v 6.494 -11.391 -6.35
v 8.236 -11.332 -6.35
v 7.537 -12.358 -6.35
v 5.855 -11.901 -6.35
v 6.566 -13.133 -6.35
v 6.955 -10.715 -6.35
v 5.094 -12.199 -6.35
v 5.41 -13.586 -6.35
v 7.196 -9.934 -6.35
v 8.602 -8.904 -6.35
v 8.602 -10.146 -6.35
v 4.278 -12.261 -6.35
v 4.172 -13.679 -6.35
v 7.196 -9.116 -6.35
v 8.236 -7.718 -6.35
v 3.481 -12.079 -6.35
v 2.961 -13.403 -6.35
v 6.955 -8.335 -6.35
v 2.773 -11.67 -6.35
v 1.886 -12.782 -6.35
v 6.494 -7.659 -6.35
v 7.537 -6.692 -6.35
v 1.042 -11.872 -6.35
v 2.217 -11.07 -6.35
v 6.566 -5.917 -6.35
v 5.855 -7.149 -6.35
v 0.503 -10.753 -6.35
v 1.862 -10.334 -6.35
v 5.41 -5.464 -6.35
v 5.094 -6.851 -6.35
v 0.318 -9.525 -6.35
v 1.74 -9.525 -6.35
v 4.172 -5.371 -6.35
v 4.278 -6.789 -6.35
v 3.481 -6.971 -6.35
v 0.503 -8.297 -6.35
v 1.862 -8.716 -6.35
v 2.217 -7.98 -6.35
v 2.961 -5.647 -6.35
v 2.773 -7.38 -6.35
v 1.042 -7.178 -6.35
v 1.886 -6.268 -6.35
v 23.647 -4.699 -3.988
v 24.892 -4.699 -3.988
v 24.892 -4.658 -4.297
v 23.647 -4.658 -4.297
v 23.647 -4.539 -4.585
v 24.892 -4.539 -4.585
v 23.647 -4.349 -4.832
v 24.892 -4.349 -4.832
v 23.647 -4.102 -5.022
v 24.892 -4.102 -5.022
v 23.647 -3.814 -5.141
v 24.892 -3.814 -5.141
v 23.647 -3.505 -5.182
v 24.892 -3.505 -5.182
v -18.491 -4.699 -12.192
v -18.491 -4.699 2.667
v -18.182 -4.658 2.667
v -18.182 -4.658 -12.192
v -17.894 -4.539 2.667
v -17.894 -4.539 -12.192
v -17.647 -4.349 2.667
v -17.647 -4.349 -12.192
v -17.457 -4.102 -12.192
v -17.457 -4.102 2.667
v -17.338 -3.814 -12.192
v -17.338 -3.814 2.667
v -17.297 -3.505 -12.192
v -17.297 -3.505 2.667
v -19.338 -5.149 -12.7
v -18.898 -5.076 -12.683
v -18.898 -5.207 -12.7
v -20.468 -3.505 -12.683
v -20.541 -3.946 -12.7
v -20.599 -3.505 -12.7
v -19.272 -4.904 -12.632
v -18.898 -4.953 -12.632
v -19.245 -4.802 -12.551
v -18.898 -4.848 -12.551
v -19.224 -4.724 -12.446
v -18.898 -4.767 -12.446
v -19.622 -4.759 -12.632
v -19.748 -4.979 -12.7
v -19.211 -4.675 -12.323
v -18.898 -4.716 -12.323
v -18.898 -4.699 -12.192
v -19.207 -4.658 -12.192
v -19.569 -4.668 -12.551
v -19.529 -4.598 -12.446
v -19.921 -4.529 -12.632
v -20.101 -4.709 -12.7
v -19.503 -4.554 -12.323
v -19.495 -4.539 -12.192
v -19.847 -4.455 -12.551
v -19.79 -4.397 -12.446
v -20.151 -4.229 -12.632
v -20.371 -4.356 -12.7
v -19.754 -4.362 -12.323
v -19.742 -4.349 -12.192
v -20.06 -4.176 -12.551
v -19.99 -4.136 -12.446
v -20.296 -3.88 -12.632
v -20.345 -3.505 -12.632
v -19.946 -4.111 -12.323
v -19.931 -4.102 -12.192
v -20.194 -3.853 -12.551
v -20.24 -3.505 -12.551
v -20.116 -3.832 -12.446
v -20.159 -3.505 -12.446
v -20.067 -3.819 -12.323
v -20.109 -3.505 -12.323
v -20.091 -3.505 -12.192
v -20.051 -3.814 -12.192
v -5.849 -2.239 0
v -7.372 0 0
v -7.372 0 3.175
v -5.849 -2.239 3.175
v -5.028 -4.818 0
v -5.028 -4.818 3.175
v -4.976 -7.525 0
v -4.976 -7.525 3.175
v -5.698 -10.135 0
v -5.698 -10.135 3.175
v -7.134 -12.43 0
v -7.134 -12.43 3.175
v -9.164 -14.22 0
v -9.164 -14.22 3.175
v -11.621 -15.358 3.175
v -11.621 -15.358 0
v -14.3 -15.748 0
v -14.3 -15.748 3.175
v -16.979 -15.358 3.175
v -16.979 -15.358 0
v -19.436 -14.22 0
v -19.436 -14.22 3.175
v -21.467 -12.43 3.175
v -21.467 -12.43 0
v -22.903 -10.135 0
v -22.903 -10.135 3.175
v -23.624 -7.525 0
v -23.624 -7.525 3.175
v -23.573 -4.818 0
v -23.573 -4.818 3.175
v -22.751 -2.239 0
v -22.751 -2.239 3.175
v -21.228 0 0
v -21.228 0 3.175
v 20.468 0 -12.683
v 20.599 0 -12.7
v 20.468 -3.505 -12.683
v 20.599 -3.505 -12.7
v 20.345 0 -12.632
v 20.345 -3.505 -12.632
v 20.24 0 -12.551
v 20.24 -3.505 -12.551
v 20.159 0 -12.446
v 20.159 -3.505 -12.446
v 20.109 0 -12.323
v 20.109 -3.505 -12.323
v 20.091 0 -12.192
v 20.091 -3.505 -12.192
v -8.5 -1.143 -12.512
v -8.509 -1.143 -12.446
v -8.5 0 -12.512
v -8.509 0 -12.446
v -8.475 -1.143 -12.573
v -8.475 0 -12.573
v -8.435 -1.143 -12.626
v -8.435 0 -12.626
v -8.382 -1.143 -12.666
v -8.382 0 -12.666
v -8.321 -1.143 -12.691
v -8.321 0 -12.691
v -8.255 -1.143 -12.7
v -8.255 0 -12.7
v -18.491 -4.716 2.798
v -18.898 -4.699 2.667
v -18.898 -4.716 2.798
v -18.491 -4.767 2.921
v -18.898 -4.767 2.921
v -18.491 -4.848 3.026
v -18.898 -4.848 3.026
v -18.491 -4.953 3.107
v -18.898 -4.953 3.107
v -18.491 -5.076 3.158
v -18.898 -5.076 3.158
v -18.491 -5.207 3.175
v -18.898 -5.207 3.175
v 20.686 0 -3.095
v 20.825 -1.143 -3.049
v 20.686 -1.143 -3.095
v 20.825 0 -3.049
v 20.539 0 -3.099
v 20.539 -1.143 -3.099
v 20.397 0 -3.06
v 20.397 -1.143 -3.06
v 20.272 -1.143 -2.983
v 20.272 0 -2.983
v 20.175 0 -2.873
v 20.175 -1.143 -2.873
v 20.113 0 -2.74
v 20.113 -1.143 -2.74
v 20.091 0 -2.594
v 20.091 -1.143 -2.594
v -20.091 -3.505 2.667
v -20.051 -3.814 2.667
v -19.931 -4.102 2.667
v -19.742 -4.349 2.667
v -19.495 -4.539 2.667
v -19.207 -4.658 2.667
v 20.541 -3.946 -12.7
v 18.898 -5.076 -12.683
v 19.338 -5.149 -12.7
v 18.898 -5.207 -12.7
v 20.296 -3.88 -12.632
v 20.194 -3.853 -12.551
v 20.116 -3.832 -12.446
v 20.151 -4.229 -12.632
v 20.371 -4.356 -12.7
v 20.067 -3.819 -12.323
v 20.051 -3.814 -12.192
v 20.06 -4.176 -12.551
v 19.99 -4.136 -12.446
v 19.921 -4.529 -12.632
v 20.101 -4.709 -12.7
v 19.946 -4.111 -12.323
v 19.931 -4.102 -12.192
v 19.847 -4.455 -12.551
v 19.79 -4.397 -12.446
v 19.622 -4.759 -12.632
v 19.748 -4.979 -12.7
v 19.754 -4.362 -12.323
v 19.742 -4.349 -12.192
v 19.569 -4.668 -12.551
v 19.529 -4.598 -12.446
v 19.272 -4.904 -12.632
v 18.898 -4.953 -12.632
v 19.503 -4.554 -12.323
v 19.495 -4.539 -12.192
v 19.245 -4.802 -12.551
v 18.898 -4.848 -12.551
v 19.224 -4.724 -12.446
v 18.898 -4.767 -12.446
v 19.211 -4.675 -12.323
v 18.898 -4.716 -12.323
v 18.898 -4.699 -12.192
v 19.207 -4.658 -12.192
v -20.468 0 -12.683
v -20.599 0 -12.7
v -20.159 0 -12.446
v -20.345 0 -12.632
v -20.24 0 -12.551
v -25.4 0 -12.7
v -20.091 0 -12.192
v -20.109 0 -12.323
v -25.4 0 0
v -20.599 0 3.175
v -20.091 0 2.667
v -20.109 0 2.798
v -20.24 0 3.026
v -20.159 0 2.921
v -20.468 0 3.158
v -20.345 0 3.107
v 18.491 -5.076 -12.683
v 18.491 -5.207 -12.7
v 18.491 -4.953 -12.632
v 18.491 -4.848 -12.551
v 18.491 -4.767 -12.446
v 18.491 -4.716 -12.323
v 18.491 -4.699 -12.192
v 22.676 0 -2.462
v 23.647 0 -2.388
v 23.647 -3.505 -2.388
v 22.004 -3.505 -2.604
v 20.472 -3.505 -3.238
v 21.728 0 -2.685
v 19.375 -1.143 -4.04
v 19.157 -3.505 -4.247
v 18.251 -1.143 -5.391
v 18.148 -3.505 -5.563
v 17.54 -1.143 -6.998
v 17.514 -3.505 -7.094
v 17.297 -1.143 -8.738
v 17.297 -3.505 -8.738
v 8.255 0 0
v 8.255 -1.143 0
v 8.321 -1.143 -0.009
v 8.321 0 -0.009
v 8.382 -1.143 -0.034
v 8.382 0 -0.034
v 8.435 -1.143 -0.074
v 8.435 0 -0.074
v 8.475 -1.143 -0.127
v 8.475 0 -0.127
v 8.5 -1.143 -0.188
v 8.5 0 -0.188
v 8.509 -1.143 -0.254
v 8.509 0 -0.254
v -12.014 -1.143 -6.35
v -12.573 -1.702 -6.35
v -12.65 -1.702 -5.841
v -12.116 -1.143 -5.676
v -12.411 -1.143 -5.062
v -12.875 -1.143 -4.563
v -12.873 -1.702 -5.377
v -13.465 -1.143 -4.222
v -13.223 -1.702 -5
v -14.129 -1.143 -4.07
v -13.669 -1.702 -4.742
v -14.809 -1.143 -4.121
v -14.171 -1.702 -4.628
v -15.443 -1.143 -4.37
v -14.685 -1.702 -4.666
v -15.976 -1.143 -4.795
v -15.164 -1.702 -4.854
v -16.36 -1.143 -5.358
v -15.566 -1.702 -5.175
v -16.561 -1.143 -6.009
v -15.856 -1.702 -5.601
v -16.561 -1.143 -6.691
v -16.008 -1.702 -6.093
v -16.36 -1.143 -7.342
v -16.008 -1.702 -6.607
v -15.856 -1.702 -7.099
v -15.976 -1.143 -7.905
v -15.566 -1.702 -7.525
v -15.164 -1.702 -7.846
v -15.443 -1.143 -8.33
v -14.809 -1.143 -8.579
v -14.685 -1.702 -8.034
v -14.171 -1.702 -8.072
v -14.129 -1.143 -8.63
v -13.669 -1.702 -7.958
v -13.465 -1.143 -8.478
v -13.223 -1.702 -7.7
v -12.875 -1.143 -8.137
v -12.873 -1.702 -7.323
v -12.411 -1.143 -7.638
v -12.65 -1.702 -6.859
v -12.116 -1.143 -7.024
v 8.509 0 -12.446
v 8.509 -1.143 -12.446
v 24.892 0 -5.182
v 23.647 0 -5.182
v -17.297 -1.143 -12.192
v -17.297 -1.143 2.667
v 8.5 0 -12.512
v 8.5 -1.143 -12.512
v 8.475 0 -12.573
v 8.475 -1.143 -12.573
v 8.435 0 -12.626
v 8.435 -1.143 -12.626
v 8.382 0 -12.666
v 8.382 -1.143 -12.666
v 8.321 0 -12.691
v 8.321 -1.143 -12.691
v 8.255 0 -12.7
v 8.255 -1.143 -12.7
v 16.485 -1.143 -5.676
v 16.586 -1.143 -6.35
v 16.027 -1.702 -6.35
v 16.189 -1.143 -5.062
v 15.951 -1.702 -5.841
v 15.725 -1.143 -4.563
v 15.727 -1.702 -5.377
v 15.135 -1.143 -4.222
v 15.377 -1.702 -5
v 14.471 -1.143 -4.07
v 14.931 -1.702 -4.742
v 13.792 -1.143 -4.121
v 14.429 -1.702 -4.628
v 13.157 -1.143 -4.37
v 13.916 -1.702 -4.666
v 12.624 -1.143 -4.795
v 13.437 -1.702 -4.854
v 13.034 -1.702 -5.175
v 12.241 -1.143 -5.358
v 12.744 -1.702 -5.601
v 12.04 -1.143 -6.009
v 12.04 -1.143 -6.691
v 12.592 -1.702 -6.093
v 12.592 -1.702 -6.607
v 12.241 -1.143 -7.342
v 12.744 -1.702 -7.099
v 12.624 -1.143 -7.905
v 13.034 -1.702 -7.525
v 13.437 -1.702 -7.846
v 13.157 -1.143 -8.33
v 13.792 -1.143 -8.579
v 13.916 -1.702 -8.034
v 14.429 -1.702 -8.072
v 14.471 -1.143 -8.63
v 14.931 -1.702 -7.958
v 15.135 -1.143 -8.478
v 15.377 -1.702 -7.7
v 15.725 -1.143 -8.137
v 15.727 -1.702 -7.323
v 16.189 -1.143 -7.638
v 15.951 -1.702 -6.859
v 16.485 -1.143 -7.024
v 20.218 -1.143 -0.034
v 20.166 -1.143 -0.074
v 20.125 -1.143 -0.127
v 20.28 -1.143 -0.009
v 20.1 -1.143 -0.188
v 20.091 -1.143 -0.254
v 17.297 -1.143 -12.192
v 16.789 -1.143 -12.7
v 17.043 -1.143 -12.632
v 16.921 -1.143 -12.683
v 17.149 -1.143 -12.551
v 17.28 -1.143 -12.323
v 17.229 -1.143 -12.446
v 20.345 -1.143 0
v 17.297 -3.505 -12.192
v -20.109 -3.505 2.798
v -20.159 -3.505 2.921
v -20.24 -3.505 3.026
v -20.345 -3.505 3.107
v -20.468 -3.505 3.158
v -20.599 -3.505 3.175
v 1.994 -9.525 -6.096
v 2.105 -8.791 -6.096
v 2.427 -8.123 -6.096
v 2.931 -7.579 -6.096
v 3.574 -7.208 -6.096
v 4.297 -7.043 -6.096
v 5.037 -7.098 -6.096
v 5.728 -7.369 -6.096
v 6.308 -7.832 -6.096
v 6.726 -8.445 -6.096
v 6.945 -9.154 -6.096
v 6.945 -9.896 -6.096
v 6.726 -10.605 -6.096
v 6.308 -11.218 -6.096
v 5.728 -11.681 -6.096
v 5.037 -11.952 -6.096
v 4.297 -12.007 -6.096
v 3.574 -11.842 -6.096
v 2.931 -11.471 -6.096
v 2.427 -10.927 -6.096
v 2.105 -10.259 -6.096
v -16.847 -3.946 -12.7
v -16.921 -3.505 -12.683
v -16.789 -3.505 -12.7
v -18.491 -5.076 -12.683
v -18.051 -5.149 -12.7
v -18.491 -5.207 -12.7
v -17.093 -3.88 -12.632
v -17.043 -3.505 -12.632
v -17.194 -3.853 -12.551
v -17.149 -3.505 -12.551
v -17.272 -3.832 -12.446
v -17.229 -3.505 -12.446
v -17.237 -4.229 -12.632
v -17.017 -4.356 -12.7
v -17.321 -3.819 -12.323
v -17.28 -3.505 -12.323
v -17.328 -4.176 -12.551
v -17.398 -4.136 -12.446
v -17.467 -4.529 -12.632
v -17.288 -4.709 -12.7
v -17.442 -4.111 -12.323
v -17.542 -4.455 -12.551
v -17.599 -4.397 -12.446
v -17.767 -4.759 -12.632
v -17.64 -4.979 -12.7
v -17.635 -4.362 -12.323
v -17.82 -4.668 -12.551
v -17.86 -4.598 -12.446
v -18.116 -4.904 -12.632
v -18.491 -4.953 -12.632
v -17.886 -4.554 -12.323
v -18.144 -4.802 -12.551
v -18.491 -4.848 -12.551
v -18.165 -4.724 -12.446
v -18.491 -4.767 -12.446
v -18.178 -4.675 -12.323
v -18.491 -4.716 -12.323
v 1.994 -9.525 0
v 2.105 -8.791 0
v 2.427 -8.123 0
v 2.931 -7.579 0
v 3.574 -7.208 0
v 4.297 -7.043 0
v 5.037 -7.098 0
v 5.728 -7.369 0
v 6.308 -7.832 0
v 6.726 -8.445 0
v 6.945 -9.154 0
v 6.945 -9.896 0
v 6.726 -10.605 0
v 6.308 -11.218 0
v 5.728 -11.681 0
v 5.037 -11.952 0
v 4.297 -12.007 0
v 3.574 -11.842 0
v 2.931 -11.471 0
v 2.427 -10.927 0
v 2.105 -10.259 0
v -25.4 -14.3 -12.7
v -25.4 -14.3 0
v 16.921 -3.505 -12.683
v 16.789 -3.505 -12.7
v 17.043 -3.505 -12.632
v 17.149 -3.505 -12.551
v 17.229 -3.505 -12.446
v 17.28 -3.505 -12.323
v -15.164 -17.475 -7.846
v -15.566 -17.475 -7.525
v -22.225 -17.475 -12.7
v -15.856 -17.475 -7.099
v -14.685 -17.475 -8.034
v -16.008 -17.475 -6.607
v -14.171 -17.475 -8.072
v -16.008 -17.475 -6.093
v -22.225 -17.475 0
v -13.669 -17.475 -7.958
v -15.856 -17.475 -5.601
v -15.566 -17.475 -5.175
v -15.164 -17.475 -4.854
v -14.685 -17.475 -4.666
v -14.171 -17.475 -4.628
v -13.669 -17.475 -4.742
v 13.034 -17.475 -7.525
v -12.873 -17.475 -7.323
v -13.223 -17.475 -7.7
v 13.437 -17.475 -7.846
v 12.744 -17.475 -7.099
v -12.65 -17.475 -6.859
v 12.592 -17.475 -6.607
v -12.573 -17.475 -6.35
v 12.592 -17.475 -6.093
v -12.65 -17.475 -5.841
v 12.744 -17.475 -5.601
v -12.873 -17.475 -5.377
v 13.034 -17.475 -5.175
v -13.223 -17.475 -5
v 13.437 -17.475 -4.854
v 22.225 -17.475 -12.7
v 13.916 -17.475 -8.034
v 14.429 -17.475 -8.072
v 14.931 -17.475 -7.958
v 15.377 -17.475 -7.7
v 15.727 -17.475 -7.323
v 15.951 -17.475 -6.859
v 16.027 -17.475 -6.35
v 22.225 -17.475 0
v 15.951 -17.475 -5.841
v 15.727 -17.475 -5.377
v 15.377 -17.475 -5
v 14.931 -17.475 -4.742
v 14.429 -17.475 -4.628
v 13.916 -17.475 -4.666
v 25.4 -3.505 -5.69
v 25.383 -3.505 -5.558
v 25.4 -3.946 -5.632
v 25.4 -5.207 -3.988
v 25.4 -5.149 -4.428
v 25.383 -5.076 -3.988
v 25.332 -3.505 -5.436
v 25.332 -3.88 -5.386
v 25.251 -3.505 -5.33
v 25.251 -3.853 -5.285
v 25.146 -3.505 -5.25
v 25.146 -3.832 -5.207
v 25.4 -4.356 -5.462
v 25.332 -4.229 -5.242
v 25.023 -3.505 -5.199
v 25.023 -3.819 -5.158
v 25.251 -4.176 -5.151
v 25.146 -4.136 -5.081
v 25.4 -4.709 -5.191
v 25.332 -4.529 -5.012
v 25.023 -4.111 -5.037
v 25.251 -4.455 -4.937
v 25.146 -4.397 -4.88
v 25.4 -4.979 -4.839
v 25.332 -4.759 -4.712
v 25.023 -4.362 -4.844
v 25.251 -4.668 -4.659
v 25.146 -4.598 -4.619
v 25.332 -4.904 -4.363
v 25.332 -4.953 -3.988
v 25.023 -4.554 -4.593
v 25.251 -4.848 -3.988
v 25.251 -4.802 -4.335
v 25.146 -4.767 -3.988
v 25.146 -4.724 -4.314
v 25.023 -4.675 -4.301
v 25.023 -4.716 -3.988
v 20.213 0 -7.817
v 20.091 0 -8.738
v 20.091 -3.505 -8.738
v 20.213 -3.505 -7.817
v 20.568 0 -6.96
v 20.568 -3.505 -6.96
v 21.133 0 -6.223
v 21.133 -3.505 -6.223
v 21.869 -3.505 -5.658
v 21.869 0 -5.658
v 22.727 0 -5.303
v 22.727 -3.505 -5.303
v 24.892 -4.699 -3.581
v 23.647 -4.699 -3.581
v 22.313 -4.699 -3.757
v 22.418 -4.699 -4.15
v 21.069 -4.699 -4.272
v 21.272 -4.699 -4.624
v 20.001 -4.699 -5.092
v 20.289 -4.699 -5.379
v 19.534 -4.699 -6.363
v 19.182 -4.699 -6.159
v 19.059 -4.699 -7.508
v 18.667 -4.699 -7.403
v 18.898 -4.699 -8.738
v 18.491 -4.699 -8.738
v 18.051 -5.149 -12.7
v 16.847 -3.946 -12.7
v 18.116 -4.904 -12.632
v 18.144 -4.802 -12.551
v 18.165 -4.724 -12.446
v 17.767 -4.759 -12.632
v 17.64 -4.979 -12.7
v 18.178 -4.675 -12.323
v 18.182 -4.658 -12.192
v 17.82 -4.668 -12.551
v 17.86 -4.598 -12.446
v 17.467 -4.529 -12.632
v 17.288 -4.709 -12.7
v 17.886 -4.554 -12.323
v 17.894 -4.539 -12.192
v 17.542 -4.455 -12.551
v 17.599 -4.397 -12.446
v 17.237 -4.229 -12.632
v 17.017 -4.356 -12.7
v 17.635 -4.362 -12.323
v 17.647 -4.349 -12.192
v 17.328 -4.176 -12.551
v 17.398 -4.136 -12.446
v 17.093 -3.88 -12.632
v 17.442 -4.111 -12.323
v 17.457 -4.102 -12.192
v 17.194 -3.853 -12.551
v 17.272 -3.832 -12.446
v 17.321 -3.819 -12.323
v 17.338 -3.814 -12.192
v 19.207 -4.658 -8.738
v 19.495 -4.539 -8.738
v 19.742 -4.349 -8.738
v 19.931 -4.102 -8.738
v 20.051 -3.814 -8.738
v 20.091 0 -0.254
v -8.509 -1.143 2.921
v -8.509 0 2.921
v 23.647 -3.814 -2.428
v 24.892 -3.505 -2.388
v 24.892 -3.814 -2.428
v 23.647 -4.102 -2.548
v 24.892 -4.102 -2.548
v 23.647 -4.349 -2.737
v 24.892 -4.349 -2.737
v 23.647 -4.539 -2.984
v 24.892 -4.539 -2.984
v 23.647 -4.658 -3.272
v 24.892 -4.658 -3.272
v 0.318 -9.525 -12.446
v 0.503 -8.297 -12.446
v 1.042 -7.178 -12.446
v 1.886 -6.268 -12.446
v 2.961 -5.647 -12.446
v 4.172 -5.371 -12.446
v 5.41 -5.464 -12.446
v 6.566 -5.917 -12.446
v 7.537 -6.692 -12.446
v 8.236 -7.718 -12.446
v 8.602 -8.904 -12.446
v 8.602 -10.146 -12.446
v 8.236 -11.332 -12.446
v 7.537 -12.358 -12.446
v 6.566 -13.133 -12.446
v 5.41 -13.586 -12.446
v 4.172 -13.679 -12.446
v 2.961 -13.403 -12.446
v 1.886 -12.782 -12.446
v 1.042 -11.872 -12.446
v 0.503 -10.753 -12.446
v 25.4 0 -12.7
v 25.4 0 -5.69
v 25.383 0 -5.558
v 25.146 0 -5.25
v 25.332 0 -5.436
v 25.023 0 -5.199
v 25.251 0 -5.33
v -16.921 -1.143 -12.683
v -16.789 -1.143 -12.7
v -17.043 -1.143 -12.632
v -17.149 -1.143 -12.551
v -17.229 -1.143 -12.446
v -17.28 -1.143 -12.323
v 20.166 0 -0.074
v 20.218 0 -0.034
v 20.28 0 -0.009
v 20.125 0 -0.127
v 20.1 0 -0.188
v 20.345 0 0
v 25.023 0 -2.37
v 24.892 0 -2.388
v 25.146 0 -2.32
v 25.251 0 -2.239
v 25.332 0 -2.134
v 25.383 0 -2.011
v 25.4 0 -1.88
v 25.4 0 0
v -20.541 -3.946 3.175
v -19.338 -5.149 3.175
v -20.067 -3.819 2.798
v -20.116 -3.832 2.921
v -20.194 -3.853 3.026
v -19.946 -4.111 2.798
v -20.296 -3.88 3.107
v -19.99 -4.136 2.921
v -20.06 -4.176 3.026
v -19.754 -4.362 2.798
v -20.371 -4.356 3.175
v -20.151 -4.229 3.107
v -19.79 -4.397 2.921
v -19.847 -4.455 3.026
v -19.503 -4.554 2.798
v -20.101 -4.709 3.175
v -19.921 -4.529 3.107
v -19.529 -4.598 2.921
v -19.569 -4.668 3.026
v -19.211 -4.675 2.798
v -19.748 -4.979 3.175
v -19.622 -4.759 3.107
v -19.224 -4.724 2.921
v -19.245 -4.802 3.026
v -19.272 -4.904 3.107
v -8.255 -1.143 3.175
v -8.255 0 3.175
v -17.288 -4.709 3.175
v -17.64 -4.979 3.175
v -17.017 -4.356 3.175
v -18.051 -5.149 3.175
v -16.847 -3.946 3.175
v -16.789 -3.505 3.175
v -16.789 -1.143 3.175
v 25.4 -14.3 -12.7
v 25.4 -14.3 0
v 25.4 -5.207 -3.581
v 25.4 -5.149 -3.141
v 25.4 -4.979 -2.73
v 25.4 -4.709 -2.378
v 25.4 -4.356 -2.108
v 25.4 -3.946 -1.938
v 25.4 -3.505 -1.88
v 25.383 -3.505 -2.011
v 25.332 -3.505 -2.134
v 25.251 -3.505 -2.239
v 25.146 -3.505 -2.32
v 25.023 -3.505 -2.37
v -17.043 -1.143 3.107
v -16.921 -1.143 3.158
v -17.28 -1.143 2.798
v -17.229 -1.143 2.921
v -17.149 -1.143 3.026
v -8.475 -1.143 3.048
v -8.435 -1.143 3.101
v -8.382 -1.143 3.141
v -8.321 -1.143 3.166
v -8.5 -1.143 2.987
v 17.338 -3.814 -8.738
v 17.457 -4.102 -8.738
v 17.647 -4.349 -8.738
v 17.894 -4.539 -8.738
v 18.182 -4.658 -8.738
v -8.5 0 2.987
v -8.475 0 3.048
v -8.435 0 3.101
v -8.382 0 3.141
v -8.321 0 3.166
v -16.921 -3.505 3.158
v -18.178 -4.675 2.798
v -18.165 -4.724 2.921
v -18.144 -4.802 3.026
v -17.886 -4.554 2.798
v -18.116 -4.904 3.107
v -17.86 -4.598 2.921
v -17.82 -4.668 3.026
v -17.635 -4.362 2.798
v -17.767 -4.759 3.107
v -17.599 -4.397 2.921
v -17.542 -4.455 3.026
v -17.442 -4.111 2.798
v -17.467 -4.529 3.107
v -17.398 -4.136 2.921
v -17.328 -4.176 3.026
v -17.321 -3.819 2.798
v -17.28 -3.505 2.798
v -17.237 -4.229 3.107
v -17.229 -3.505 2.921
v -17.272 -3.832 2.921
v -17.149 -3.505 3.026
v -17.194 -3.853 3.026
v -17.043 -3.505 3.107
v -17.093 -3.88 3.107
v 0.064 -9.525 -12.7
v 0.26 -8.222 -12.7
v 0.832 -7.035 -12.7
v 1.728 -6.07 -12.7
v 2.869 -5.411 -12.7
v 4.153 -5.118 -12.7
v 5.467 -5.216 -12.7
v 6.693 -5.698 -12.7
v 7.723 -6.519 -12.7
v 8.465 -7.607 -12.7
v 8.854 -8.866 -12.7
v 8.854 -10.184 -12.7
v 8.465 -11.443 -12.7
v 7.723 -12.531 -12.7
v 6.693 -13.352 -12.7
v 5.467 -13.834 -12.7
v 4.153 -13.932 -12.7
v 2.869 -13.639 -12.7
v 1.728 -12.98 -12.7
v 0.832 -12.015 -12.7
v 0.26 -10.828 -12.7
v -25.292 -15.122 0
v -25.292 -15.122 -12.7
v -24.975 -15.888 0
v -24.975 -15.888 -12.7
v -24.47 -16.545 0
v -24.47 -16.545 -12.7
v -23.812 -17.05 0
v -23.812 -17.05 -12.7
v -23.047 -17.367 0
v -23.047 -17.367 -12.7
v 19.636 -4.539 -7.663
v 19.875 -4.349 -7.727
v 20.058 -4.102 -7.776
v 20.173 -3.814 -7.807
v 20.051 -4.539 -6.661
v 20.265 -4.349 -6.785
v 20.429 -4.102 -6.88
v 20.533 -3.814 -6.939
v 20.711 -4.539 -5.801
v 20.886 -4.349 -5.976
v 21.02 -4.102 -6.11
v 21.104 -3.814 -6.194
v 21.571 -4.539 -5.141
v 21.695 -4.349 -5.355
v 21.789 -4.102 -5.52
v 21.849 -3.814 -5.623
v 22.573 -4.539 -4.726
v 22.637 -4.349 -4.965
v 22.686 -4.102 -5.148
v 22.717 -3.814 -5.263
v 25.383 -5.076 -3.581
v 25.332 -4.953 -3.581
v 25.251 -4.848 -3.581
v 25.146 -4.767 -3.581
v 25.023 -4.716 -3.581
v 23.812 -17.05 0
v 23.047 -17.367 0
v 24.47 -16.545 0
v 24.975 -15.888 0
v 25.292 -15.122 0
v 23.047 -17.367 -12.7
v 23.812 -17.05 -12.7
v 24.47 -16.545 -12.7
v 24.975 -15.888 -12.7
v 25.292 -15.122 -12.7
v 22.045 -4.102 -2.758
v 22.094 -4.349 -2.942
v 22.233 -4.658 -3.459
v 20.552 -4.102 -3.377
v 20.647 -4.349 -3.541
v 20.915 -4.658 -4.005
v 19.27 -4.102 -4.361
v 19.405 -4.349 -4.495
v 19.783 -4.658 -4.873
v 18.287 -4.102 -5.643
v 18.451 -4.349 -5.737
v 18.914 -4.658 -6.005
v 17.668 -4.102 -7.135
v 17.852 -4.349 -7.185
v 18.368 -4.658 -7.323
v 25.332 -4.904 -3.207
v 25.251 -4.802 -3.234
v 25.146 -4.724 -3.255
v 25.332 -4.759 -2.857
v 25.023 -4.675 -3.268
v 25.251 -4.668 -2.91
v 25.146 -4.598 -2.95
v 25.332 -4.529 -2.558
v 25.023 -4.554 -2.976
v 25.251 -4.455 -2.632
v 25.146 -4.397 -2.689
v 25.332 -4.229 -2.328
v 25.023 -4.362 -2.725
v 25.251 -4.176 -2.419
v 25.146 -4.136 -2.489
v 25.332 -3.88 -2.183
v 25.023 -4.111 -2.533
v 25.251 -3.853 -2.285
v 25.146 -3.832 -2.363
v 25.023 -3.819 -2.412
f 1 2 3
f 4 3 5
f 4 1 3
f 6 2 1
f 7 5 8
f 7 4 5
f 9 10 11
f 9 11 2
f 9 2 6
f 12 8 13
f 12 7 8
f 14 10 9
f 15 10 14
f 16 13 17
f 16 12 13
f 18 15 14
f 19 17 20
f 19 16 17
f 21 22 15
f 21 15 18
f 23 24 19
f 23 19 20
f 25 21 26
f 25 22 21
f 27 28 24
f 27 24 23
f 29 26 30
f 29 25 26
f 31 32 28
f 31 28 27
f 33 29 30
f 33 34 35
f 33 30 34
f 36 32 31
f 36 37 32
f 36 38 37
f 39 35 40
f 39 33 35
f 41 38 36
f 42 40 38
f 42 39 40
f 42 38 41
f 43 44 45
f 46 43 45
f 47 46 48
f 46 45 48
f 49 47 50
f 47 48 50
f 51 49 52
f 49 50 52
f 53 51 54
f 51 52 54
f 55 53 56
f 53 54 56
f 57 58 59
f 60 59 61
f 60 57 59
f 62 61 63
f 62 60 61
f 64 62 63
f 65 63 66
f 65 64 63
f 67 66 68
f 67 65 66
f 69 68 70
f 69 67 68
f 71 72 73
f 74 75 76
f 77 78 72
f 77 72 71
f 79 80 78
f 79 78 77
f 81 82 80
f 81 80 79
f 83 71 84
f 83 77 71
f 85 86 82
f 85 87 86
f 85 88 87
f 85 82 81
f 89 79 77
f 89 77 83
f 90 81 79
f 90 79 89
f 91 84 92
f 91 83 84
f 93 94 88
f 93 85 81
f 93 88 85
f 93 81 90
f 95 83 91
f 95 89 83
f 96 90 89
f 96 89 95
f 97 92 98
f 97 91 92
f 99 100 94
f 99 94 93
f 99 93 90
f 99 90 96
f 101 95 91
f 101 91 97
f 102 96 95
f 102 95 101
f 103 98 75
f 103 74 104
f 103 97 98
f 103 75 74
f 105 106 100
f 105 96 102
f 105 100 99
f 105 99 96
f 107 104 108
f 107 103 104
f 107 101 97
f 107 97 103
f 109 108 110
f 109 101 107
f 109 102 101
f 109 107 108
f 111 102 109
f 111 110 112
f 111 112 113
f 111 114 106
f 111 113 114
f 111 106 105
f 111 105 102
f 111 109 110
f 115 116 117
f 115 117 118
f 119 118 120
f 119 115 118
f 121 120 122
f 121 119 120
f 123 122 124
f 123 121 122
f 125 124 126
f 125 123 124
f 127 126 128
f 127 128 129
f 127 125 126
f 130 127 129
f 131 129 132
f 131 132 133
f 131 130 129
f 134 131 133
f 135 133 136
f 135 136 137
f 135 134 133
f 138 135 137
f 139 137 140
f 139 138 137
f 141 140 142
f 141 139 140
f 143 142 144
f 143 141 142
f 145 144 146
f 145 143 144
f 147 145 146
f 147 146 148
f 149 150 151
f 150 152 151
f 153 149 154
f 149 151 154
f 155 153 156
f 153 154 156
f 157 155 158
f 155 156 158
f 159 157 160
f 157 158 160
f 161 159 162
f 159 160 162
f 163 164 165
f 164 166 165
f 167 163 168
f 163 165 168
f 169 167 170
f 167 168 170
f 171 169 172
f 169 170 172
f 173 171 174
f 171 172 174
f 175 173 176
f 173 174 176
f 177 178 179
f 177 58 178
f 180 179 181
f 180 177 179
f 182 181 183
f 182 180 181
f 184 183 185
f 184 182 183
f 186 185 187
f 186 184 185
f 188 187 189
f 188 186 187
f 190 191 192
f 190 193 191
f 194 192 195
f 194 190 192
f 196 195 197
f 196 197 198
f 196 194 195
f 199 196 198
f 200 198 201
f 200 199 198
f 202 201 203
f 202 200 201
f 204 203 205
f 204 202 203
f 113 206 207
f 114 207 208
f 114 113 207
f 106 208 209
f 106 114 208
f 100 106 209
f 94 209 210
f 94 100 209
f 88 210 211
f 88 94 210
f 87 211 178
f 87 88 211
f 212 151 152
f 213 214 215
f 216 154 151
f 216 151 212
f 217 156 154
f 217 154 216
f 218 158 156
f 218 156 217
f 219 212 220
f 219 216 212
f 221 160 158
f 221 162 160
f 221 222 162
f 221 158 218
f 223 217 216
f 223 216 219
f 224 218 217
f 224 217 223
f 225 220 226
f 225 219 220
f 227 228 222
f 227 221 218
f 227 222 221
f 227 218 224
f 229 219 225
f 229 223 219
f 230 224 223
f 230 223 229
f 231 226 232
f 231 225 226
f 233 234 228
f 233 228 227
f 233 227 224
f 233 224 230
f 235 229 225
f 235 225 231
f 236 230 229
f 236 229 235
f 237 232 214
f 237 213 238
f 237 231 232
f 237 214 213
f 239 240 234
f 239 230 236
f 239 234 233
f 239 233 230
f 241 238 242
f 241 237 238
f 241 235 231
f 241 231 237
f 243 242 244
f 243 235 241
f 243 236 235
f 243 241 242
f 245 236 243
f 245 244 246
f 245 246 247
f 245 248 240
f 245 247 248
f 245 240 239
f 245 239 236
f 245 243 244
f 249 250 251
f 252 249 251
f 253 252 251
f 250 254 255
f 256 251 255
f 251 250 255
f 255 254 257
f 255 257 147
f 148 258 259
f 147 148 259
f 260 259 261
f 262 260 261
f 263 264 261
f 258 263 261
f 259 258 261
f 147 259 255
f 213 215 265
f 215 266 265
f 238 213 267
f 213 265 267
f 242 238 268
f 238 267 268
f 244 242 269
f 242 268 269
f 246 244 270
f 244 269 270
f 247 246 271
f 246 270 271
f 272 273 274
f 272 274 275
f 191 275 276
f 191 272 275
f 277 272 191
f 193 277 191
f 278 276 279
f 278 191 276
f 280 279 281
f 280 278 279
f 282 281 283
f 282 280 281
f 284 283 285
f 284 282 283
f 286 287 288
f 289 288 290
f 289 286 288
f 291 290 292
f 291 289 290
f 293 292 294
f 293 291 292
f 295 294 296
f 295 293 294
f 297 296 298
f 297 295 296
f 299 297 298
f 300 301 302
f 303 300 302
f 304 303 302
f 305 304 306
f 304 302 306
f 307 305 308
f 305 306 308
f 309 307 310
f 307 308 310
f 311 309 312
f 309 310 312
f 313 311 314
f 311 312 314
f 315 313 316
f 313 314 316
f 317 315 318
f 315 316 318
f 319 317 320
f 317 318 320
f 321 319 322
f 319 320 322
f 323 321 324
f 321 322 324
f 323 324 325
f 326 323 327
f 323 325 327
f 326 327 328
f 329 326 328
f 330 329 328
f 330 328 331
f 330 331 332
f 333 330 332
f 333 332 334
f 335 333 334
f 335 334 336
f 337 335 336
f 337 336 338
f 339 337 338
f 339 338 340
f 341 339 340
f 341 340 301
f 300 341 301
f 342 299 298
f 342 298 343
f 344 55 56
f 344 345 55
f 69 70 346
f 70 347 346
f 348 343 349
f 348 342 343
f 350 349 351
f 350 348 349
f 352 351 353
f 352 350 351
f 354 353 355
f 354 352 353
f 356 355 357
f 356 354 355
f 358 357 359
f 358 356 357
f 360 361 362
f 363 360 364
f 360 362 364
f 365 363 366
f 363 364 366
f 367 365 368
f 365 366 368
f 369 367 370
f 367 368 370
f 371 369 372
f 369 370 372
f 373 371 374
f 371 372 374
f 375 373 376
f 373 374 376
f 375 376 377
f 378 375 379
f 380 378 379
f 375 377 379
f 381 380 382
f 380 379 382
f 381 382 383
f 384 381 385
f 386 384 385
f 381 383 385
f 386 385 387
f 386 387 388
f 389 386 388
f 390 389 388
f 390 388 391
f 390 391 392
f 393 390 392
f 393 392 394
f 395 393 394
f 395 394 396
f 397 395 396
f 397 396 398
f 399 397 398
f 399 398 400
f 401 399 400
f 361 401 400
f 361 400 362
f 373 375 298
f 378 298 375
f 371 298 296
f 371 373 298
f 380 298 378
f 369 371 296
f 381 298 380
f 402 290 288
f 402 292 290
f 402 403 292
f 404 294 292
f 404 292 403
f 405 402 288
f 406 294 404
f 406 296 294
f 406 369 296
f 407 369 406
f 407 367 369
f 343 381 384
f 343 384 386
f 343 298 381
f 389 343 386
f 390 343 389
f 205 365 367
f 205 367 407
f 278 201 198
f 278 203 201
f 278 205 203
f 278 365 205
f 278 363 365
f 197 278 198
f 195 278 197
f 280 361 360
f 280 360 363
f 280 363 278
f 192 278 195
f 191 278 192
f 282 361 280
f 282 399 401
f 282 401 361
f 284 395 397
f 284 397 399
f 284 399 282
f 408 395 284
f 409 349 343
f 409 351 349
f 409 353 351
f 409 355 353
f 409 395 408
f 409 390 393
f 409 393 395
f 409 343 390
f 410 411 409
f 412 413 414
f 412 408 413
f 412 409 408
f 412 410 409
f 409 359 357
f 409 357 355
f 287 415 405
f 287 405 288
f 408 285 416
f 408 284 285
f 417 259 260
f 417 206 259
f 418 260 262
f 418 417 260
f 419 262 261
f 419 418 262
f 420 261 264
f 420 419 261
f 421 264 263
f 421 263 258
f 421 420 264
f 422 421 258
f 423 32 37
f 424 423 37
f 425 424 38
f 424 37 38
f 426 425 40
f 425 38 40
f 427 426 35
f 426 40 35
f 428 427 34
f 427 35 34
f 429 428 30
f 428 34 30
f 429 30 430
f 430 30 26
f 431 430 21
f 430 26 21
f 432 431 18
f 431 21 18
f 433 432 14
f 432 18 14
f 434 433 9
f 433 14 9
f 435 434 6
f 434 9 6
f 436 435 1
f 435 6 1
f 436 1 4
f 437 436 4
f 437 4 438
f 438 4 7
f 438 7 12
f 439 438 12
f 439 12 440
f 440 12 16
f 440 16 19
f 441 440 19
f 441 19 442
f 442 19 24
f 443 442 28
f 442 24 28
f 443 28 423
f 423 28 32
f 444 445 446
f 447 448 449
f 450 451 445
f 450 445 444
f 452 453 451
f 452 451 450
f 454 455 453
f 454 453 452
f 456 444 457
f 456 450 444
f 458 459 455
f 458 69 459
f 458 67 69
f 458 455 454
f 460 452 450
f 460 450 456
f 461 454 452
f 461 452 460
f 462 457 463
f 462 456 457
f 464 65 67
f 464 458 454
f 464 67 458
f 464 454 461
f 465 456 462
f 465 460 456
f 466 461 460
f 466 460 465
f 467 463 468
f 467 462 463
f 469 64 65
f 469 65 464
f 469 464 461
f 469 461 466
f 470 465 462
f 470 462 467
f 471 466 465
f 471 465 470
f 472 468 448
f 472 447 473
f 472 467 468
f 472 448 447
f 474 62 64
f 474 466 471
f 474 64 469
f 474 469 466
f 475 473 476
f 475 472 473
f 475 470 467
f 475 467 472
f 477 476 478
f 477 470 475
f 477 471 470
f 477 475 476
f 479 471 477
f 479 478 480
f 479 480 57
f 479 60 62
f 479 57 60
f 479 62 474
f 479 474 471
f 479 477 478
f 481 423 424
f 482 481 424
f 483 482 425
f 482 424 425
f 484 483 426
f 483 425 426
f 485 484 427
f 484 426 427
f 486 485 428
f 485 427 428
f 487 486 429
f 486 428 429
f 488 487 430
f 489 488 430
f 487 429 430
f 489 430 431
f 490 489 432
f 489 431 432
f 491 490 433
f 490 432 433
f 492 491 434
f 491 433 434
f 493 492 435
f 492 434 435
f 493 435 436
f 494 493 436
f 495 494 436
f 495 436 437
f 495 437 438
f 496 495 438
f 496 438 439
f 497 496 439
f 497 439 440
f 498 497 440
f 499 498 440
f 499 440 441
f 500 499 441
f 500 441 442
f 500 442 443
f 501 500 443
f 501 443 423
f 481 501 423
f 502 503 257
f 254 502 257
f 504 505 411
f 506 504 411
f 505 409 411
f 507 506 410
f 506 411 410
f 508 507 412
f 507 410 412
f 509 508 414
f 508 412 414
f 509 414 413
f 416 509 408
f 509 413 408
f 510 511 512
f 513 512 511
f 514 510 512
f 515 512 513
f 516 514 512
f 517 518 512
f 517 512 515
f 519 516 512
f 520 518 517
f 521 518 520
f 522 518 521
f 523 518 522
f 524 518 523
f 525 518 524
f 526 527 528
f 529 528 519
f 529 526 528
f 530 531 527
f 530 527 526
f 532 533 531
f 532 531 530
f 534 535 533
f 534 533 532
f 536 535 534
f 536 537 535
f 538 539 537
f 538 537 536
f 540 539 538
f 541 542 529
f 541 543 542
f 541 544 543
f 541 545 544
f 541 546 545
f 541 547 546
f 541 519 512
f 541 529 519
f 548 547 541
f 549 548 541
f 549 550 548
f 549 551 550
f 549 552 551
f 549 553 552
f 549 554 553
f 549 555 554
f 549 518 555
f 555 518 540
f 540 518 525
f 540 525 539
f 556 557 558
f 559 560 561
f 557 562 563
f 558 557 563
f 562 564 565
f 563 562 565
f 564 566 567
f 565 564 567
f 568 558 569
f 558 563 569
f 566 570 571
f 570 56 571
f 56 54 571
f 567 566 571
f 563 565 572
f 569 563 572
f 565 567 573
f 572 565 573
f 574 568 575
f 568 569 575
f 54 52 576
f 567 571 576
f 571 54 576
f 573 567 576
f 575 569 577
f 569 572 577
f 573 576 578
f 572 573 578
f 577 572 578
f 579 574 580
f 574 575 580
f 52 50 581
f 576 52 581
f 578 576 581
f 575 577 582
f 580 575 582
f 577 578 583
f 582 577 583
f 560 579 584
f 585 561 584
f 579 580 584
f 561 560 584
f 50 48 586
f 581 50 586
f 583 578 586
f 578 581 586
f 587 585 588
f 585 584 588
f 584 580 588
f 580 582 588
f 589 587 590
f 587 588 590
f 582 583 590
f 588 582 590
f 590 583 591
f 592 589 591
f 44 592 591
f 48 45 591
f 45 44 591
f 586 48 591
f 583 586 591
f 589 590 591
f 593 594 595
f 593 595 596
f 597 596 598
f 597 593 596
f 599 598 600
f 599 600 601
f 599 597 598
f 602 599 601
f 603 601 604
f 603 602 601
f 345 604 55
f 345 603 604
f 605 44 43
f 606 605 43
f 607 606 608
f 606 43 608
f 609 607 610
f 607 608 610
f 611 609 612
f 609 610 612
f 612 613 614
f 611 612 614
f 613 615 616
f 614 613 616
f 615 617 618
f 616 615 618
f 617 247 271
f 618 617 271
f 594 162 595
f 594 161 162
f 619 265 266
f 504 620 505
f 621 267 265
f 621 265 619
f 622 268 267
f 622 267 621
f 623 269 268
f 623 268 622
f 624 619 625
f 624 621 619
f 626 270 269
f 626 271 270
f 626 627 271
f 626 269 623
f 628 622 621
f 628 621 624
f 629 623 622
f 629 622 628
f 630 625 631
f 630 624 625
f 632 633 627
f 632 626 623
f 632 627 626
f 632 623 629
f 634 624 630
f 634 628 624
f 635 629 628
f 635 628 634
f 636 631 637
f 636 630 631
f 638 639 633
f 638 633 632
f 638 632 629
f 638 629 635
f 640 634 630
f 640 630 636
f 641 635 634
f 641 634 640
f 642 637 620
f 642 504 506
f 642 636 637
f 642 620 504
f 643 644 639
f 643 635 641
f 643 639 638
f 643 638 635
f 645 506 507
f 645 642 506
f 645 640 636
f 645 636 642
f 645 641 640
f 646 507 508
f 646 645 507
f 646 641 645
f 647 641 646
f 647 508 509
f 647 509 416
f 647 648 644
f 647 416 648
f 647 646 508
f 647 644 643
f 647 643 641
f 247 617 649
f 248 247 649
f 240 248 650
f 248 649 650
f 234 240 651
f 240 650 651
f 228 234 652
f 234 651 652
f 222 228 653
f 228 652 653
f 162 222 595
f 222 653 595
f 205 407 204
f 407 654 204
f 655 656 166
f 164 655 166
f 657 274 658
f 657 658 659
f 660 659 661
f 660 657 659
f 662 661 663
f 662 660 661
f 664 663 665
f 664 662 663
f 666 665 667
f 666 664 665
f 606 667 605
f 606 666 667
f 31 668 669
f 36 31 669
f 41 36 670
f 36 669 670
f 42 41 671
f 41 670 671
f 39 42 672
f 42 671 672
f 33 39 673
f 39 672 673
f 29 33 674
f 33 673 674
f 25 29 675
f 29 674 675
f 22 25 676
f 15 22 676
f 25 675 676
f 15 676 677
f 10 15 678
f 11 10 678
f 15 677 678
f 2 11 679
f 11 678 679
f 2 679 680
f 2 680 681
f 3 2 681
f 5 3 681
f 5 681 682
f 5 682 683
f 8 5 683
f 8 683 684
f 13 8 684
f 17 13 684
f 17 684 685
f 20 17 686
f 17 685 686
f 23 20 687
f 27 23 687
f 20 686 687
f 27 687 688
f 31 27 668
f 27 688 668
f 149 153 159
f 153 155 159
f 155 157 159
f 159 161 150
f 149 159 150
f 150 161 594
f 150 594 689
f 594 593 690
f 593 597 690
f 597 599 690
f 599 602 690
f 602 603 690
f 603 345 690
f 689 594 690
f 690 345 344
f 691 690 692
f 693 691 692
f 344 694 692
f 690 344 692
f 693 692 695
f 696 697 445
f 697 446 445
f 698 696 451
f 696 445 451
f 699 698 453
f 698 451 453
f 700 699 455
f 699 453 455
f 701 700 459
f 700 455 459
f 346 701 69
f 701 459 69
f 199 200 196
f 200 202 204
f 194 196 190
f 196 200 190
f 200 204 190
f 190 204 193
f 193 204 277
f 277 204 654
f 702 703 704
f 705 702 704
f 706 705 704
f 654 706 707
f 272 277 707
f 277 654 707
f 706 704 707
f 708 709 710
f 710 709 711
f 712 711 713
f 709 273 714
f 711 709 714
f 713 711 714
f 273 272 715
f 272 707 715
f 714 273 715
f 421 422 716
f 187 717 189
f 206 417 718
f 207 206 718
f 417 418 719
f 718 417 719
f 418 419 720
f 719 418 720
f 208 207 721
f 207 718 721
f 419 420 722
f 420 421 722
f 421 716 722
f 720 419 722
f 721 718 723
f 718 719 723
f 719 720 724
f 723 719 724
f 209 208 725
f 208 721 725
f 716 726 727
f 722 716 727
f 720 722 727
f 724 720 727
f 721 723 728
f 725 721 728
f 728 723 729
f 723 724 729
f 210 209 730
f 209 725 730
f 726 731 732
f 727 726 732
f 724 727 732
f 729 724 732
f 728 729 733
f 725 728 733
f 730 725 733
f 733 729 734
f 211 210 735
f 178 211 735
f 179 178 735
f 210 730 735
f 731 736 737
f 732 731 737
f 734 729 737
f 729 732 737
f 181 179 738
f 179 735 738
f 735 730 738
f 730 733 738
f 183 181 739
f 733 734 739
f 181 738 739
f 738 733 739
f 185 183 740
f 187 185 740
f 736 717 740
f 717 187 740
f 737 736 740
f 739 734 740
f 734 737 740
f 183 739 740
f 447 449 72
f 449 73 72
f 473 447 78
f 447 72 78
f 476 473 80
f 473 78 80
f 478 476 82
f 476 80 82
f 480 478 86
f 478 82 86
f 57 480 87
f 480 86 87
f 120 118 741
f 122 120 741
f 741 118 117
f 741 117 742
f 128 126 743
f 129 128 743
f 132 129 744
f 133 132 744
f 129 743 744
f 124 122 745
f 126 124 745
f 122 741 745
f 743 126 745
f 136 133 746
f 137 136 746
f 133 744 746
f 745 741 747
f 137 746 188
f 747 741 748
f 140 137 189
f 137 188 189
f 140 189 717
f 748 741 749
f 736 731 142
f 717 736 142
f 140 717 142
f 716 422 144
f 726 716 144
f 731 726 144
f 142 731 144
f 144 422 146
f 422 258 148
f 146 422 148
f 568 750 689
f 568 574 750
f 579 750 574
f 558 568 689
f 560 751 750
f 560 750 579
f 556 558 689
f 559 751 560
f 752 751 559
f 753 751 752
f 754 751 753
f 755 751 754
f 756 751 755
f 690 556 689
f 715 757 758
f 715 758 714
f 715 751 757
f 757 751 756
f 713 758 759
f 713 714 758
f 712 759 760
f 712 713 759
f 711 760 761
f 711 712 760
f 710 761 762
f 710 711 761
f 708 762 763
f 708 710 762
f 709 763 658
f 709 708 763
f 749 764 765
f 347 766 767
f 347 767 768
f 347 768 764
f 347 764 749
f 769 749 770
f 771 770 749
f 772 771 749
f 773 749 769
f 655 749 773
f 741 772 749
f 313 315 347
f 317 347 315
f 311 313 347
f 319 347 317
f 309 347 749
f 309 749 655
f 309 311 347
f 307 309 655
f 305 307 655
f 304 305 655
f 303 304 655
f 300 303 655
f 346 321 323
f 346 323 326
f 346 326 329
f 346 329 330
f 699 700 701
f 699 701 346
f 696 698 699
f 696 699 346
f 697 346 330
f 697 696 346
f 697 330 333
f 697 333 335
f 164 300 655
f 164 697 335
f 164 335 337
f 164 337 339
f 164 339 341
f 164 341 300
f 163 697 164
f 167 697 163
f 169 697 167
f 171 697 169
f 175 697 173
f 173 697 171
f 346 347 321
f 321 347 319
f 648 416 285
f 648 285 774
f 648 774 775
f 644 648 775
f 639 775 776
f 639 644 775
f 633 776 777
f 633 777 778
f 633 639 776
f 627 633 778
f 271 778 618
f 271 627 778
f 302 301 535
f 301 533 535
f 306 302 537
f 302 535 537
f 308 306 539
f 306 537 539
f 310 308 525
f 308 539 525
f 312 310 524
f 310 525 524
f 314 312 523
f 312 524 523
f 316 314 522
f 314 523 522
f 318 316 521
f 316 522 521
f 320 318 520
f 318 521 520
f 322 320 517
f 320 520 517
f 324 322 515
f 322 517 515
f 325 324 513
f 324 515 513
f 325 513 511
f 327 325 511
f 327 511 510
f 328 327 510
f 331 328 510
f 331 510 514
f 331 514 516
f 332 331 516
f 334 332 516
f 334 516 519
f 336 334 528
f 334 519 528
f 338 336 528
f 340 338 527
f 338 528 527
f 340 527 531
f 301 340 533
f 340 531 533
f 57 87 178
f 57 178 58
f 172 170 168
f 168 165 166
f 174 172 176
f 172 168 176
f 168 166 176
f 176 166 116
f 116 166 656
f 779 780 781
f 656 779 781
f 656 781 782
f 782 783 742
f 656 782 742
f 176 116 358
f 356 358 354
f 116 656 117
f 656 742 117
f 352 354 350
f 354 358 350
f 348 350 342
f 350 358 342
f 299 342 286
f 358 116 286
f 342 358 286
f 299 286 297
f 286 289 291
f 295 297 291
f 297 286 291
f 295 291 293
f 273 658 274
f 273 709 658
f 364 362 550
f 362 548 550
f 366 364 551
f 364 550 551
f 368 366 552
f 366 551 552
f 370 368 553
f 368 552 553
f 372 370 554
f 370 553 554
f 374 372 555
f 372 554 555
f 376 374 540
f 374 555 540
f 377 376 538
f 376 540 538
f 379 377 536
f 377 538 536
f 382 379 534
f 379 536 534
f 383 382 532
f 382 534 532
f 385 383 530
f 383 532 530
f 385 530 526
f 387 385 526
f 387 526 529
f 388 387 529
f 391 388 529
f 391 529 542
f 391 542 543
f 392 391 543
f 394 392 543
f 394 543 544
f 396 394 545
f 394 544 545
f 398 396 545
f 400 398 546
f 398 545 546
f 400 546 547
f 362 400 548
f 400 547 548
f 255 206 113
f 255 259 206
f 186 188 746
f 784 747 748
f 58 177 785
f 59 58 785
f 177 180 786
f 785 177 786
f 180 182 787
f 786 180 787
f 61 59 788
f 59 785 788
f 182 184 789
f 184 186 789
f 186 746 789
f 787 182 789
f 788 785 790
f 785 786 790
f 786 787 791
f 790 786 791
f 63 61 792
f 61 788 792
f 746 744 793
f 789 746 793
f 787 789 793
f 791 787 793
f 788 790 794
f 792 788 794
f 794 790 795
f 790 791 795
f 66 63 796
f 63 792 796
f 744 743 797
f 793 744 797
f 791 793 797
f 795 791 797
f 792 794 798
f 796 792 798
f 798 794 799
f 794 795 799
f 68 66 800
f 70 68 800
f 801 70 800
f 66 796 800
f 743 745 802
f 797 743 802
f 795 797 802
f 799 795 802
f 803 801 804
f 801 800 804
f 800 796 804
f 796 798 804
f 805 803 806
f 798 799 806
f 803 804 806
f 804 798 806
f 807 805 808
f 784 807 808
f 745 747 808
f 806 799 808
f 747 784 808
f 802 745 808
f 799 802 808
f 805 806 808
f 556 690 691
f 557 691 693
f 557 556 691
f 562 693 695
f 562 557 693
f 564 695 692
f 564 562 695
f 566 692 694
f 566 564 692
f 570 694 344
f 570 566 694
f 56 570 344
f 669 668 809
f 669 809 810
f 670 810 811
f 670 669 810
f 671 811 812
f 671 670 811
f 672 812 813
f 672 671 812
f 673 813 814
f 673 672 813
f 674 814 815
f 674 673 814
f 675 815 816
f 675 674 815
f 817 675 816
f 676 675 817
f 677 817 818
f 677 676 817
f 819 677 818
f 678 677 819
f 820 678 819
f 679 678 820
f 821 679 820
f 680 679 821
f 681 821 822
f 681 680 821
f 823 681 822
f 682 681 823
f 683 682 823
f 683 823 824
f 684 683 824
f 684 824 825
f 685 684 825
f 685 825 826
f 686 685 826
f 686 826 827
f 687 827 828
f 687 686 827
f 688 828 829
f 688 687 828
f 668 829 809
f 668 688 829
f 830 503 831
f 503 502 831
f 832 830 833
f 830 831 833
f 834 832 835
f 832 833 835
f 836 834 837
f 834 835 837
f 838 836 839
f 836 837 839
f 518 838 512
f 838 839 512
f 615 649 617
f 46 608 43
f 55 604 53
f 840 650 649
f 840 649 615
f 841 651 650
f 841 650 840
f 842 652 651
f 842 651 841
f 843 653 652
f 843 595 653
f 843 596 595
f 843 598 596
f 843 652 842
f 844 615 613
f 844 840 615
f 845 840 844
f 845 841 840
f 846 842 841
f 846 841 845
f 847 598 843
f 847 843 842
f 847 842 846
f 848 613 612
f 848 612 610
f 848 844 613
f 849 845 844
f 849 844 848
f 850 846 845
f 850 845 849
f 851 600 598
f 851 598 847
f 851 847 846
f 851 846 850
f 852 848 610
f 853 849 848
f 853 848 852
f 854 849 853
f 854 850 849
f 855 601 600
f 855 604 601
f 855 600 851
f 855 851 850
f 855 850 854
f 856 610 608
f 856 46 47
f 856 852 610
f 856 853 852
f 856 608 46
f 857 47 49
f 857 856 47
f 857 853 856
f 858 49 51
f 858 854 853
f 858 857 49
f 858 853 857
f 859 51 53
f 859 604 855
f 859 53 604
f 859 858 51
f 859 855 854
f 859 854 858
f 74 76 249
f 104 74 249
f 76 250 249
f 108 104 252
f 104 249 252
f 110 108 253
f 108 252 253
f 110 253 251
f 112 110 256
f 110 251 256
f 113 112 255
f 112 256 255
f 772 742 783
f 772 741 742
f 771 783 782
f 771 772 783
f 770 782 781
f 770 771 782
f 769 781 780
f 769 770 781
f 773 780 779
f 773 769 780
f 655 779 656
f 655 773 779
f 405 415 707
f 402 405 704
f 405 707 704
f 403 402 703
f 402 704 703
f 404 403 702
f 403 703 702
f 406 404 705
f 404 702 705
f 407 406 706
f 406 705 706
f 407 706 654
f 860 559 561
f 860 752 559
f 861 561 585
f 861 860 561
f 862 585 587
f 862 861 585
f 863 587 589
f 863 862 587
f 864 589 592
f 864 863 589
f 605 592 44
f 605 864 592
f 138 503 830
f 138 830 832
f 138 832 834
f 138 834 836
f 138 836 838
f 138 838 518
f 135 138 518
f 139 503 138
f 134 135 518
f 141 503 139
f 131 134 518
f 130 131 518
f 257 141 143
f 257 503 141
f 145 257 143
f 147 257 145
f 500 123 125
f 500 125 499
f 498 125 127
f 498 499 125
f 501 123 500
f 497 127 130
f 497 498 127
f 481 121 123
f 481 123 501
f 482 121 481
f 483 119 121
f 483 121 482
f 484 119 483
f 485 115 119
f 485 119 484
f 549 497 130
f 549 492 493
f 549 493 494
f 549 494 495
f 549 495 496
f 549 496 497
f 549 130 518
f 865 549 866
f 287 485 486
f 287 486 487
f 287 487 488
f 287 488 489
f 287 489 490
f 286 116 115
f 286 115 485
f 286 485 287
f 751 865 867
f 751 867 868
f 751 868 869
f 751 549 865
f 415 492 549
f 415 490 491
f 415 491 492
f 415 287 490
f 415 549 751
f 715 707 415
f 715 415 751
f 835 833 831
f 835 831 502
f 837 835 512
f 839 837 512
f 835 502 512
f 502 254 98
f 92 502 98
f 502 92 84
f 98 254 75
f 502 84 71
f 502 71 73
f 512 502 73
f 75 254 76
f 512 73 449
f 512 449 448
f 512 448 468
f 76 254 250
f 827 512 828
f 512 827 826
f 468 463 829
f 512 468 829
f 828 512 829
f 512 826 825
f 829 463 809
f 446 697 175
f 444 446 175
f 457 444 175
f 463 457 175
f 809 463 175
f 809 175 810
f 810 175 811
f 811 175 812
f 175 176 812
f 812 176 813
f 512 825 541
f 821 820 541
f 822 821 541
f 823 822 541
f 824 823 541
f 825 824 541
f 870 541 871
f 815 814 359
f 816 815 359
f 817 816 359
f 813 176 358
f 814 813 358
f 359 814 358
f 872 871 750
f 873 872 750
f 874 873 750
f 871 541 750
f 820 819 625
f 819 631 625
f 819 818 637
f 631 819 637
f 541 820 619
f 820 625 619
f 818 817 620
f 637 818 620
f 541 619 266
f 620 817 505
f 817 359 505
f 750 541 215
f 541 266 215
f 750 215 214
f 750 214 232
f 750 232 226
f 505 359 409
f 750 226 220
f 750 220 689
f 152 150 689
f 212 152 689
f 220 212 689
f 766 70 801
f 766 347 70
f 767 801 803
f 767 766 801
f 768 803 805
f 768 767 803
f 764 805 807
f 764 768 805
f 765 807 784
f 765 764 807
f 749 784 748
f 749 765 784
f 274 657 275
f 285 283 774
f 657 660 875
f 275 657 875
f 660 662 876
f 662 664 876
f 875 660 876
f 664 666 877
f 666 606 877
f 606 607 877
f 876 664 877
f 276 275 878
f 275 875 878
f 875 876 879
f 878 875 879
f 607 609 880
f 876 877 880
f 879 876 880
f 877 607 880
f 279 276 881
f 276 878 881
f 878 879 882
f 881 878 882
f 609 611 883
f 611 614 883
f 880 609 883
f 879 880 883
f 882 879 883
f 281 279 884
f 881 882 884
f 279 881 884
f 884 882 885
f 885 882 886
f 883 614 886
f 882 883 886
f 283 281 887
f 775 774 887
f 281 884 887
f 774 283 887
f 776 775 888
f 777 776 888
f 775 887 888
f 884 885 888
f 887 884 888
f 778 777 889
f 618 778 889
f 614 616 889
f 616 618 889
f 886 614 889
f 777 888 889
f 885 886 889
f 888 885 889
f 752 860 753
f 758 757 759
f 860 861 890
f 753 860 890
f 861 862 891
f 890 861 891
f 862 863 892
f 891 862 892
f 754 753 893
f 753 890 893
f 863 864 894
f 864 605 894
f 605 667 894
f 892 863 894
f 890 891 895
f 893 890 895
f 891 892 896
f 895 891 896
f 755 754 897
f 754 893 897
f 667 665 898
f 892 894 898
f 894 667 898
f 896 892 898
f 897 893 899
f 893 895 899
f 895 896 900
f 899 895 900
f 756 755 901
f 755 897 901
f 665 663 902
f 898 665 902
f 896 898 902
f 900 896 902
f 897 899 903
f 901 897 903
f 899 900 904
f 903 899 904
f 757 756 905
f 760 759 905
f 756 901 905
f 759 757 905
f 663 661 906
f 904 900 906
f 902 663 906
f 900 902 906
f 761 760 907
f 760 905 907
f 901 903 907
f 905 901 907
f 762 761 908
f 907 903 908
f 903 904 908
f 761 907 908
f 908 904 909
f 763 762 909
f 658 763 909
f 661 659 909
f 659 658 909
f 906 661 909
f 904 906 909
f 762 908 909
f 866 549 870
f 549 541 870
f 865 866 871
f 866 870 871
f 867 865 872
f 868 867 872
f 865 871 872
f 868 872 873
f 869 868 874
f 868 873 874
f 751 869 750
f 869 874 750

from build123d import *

# Parameters (mm, degrees)
SKETCH1_W                       = 50.8
SKETCH1_H                       = 17.4752
BOSS_EXTRUDE1_DEPTH             = 12.7
BOSS_EXTRUDE2_DEPTH             = 3.175
SKETCH12_W                      = 11.5824
SKETCH12_H                      = 31.04642485
SKETCH12_H_2                    = 37.220312072
CUT_EXTRUDE5_DEPTH              = 1.143
F_9_0_196_DIAMETER_HOLE1_D      = 4.9784
FILLET1_R                       = 3.175
F_8_32_TAPPED_HOLE2_D           = 3.4544
F_8_32_TAPPED_HOLE2_CSINK_D     = 4.572
F_8_32_TAPPED_HOLE2_CSINK_ANGLE = 90
SKETCH11_W                      = 2.794
SKETCH11_H                      = 23.198016048
CUT_EXTRUDE4_DEPTH              = 4.699
FILLET2_R                       = 1.1938
FILLET3_R                       = 0.508
FILLET4_R                       = 0.254
SKETCH16_R                      = 4.1656
CUT_EXTRUDE6_DEPTH              = 6.35
CHAMFER1_SIZE                   = 0.254
FILLET8_R                       = 0.508


with BuildPart() as part:
    # Sketch1 → Boss-Extrude1 (new body)
    with BuildSketch(Plane.XY):
        with Locations((0, -8.7376)):
            Rectangle(SKETCH1_W, SKETCH1_H)
    extrude(amount=-BOSS_EXTRUDE1_DEPTH)

    # Sketch2 → Boss-Extrude2 (add)
    with BuildSketch(Plane.XY):
        with BuildLine():
            Line((-21.228396302, 0), (-7.372003698, 0))
            ThreePointArc((-7.372003698, 0), (-14.3002, -15.748), (-21.228396302, 0))
        make_face()
    extrude(amount=BOSS_EXTRUDE2_DEPTH)

    # Sketch12 → Cut-Extrude5 (cut)
    with BuildSketch(Plane(origin=(0, 0, 0), x_dir=(1, 0, 0), z_dir=(0, 1, 0))):
        with Locations((14.3002, 4.674371042)):
            Rectangle(SKETCH12_W, SKETCH12_H)
        with Locations((-14.3002, 2.29159367)):
            Rectangle(SKETCH12_W, SKETCH12_H_2)
    extrude(amount=-CUT_EXTRUDE5_DEPTH, mode=Mode.SUBTRACT)

    # #9 (0.196) Diameter Hole1 (through all)
    with Locations(Plane(origin=(33.7312, -2.208443868, 0), x_dir=(1, 0, 0), z_dir=(0, 0, 1))):
        with Locations((-29.247846689, -7.316556132)):
            Hole(F_9_0_196_DIAMETER_HOLE1_D / 2)

    # Fillet1
    fillet1_edges = [part.edges().sort_by_distance(p)[0] for p in [
        (25.4, -17.4752, -6.35),
        (-25.4, -17.4752, -6.35),
    ]]
    fillet(fillet1_edges, radius=FILLET1_R)

    # #8-32 Tapped Hole2 (through all)
    with Locations(Plane(origin=(26.700019519, -1.143, -0.758269739), x_dir=(-1, 0, 0), z_dir=(0, 1, 0))):
        with Locations((12.399819519, -5.591730261), (41.000219519, -5.591730261)):
            CounterSinkHole(F_8_32_TAPPED_HOLE2_D / 2, F_8_32_TAPPED_HOLE2_CSINK_D / 2, counter_sink_angle=F_8_32_TAPPED_HOLE2_CSINK_ANGLE)

    # Sketch11 → Cut-Extrude4 (cut)
    with BuildSketch(Plane(origin=(0, 0, 0), x_dir=(1, 0, 0), z_dir=(0, 1, 0))):
        with BuildLine():
            Line((20.0914, 20.298121943), (20.0914, 8.7376))
            ThreePointArc((20.0914, 8.7376), (21.132928286, 6.223128286), (23.6474, 5.1816))
            Line((23.6474, 5.1816), (32.110940615, 5.1816))
            Line((32.110940615, 5.1816), (32.110940615, 2.3876))
            Line((32.110940615, 2.3876), (23.6474, 2.3876))
            ThreePointArc((23.6474, 2.3876), (19.157271939, 4.247471939), (17.2974, 8.7376))
            Line((17.2974, 8.7376), (17.2974, 20.298121943))
            Line((17.2974, 20.298121943), (20.0914, 20.298121943))
        make_face()
        with Locations((-18.6944, 5.241099364)):
            Rectangle(SKETCH11_W, SKETCH11_H)
    extrude(amount=-CUT_EXTRUDE4_DEPTH, mode=Mode.SUBTRACT)

    # Fillet2
    fillet2_edges = [part.edges().sort_by_distance(p)[0] for p in [
        (24.5237, -4.699, -5.1816),
        (24.5237, -4.699, -2.3876),
        (19.157271939, -4.699, -4.247471939),
        (17.2974, -4.699, -10.7188),
        (20.0914, -4.699, -10.7188),
        (21.132928286, -4.699, -6.223128286),
        (-17.2974, -4.699, -4.7625),
        (-20.0914, -4.699, -4.7625),
    ]]
    fillet(fillet2_edges, radius=FILLET2_R)

    # Fillet3
    fillet3_edges = [part.edges().sort_by_distance(p)[0] for p in [
        (20.0914, -0.5715, -3.476671945),
    ]]
    fillet(fillet3_edges, radius=FILLET3_R)

    # Fillet4
    fillet4_edges = [part.edges().sort_by_distance(p)[0] for p in [
        (-8.509, -0.5715, 3.175),
        (-8.509, -0.5715, -12.7),
        (8.509, -0.5715, -12.7),
        (8.509, -0.5715, 0),
        (20.0914, -0.5715, 0),
    ]]
    fillet(fillet4_edges, radius=FILLET4_R)

    # Sketch16 → Cut-Extrude6 (cut)
    with BuildSketch(Plane(origin=(0, 0, -12.7), x_dir=(-1, 0, 0), z_dir=(0, 0, -1))):
        with Locations((-4.483353311, -9.525)):
            Circle(SKETCH16_R)
    extrude(amount=-CUT_EXTRUDE6_DEPTH, mode=Mode.SUBTRACT)

    # Chamfer1
    chamfer1_edges = [part.edges().sort_by_distance(p)[0] for p in [
        (8.648953311, -9.525, -12.7),
        (6.972553311, -9.525, -6.35),
    ]]
    chamfer(chamfer1_edges, length=CHAMFER1_SIZE)

    # Fillet8
    fillet8_edges = [part.edges().sort_by_distance(p)[0] for p in [
        (25.4, -1.7526, -2.3876),
        (17.2974, -2.3241, -12.7),
        (18.6944, -4.699, -12.7),
        (25.4, -4.699, -3.7846),
        (25.4, -1.7526, -5.1816),
        (-18.6944, -4.699, -12.7),
        (-18.6944, -4.699, 3.175),
        (-17.2974, -2.3241, 3.175),
        (-17.2974, -2.3241, -12.7),
        (20.0914, -1.7526, -12.7),
        (25.4, -4.349344075, -2.737255925),
        (25.4, -4.349344075, -4.831944075),
        (-19.741744075, -4.349344075, -12.7),
        (-19.741744075, -4.349344075, 3.175),
        (-17.647055925, -4.349344075, 3.175),
        (-17.647055925, -4.349344075, -12.7),
        (17.647055925, -4.349344075, -12.7),
        (19.741744075, -4.349344075, -12.7),
        (-20.0914, -1.7526, 3.175),
        (-20.0914, -1.7526, -12.7),
    ]]
    fillet(fillet8_edges, radius=FILLET8_R)


solid = part.part
